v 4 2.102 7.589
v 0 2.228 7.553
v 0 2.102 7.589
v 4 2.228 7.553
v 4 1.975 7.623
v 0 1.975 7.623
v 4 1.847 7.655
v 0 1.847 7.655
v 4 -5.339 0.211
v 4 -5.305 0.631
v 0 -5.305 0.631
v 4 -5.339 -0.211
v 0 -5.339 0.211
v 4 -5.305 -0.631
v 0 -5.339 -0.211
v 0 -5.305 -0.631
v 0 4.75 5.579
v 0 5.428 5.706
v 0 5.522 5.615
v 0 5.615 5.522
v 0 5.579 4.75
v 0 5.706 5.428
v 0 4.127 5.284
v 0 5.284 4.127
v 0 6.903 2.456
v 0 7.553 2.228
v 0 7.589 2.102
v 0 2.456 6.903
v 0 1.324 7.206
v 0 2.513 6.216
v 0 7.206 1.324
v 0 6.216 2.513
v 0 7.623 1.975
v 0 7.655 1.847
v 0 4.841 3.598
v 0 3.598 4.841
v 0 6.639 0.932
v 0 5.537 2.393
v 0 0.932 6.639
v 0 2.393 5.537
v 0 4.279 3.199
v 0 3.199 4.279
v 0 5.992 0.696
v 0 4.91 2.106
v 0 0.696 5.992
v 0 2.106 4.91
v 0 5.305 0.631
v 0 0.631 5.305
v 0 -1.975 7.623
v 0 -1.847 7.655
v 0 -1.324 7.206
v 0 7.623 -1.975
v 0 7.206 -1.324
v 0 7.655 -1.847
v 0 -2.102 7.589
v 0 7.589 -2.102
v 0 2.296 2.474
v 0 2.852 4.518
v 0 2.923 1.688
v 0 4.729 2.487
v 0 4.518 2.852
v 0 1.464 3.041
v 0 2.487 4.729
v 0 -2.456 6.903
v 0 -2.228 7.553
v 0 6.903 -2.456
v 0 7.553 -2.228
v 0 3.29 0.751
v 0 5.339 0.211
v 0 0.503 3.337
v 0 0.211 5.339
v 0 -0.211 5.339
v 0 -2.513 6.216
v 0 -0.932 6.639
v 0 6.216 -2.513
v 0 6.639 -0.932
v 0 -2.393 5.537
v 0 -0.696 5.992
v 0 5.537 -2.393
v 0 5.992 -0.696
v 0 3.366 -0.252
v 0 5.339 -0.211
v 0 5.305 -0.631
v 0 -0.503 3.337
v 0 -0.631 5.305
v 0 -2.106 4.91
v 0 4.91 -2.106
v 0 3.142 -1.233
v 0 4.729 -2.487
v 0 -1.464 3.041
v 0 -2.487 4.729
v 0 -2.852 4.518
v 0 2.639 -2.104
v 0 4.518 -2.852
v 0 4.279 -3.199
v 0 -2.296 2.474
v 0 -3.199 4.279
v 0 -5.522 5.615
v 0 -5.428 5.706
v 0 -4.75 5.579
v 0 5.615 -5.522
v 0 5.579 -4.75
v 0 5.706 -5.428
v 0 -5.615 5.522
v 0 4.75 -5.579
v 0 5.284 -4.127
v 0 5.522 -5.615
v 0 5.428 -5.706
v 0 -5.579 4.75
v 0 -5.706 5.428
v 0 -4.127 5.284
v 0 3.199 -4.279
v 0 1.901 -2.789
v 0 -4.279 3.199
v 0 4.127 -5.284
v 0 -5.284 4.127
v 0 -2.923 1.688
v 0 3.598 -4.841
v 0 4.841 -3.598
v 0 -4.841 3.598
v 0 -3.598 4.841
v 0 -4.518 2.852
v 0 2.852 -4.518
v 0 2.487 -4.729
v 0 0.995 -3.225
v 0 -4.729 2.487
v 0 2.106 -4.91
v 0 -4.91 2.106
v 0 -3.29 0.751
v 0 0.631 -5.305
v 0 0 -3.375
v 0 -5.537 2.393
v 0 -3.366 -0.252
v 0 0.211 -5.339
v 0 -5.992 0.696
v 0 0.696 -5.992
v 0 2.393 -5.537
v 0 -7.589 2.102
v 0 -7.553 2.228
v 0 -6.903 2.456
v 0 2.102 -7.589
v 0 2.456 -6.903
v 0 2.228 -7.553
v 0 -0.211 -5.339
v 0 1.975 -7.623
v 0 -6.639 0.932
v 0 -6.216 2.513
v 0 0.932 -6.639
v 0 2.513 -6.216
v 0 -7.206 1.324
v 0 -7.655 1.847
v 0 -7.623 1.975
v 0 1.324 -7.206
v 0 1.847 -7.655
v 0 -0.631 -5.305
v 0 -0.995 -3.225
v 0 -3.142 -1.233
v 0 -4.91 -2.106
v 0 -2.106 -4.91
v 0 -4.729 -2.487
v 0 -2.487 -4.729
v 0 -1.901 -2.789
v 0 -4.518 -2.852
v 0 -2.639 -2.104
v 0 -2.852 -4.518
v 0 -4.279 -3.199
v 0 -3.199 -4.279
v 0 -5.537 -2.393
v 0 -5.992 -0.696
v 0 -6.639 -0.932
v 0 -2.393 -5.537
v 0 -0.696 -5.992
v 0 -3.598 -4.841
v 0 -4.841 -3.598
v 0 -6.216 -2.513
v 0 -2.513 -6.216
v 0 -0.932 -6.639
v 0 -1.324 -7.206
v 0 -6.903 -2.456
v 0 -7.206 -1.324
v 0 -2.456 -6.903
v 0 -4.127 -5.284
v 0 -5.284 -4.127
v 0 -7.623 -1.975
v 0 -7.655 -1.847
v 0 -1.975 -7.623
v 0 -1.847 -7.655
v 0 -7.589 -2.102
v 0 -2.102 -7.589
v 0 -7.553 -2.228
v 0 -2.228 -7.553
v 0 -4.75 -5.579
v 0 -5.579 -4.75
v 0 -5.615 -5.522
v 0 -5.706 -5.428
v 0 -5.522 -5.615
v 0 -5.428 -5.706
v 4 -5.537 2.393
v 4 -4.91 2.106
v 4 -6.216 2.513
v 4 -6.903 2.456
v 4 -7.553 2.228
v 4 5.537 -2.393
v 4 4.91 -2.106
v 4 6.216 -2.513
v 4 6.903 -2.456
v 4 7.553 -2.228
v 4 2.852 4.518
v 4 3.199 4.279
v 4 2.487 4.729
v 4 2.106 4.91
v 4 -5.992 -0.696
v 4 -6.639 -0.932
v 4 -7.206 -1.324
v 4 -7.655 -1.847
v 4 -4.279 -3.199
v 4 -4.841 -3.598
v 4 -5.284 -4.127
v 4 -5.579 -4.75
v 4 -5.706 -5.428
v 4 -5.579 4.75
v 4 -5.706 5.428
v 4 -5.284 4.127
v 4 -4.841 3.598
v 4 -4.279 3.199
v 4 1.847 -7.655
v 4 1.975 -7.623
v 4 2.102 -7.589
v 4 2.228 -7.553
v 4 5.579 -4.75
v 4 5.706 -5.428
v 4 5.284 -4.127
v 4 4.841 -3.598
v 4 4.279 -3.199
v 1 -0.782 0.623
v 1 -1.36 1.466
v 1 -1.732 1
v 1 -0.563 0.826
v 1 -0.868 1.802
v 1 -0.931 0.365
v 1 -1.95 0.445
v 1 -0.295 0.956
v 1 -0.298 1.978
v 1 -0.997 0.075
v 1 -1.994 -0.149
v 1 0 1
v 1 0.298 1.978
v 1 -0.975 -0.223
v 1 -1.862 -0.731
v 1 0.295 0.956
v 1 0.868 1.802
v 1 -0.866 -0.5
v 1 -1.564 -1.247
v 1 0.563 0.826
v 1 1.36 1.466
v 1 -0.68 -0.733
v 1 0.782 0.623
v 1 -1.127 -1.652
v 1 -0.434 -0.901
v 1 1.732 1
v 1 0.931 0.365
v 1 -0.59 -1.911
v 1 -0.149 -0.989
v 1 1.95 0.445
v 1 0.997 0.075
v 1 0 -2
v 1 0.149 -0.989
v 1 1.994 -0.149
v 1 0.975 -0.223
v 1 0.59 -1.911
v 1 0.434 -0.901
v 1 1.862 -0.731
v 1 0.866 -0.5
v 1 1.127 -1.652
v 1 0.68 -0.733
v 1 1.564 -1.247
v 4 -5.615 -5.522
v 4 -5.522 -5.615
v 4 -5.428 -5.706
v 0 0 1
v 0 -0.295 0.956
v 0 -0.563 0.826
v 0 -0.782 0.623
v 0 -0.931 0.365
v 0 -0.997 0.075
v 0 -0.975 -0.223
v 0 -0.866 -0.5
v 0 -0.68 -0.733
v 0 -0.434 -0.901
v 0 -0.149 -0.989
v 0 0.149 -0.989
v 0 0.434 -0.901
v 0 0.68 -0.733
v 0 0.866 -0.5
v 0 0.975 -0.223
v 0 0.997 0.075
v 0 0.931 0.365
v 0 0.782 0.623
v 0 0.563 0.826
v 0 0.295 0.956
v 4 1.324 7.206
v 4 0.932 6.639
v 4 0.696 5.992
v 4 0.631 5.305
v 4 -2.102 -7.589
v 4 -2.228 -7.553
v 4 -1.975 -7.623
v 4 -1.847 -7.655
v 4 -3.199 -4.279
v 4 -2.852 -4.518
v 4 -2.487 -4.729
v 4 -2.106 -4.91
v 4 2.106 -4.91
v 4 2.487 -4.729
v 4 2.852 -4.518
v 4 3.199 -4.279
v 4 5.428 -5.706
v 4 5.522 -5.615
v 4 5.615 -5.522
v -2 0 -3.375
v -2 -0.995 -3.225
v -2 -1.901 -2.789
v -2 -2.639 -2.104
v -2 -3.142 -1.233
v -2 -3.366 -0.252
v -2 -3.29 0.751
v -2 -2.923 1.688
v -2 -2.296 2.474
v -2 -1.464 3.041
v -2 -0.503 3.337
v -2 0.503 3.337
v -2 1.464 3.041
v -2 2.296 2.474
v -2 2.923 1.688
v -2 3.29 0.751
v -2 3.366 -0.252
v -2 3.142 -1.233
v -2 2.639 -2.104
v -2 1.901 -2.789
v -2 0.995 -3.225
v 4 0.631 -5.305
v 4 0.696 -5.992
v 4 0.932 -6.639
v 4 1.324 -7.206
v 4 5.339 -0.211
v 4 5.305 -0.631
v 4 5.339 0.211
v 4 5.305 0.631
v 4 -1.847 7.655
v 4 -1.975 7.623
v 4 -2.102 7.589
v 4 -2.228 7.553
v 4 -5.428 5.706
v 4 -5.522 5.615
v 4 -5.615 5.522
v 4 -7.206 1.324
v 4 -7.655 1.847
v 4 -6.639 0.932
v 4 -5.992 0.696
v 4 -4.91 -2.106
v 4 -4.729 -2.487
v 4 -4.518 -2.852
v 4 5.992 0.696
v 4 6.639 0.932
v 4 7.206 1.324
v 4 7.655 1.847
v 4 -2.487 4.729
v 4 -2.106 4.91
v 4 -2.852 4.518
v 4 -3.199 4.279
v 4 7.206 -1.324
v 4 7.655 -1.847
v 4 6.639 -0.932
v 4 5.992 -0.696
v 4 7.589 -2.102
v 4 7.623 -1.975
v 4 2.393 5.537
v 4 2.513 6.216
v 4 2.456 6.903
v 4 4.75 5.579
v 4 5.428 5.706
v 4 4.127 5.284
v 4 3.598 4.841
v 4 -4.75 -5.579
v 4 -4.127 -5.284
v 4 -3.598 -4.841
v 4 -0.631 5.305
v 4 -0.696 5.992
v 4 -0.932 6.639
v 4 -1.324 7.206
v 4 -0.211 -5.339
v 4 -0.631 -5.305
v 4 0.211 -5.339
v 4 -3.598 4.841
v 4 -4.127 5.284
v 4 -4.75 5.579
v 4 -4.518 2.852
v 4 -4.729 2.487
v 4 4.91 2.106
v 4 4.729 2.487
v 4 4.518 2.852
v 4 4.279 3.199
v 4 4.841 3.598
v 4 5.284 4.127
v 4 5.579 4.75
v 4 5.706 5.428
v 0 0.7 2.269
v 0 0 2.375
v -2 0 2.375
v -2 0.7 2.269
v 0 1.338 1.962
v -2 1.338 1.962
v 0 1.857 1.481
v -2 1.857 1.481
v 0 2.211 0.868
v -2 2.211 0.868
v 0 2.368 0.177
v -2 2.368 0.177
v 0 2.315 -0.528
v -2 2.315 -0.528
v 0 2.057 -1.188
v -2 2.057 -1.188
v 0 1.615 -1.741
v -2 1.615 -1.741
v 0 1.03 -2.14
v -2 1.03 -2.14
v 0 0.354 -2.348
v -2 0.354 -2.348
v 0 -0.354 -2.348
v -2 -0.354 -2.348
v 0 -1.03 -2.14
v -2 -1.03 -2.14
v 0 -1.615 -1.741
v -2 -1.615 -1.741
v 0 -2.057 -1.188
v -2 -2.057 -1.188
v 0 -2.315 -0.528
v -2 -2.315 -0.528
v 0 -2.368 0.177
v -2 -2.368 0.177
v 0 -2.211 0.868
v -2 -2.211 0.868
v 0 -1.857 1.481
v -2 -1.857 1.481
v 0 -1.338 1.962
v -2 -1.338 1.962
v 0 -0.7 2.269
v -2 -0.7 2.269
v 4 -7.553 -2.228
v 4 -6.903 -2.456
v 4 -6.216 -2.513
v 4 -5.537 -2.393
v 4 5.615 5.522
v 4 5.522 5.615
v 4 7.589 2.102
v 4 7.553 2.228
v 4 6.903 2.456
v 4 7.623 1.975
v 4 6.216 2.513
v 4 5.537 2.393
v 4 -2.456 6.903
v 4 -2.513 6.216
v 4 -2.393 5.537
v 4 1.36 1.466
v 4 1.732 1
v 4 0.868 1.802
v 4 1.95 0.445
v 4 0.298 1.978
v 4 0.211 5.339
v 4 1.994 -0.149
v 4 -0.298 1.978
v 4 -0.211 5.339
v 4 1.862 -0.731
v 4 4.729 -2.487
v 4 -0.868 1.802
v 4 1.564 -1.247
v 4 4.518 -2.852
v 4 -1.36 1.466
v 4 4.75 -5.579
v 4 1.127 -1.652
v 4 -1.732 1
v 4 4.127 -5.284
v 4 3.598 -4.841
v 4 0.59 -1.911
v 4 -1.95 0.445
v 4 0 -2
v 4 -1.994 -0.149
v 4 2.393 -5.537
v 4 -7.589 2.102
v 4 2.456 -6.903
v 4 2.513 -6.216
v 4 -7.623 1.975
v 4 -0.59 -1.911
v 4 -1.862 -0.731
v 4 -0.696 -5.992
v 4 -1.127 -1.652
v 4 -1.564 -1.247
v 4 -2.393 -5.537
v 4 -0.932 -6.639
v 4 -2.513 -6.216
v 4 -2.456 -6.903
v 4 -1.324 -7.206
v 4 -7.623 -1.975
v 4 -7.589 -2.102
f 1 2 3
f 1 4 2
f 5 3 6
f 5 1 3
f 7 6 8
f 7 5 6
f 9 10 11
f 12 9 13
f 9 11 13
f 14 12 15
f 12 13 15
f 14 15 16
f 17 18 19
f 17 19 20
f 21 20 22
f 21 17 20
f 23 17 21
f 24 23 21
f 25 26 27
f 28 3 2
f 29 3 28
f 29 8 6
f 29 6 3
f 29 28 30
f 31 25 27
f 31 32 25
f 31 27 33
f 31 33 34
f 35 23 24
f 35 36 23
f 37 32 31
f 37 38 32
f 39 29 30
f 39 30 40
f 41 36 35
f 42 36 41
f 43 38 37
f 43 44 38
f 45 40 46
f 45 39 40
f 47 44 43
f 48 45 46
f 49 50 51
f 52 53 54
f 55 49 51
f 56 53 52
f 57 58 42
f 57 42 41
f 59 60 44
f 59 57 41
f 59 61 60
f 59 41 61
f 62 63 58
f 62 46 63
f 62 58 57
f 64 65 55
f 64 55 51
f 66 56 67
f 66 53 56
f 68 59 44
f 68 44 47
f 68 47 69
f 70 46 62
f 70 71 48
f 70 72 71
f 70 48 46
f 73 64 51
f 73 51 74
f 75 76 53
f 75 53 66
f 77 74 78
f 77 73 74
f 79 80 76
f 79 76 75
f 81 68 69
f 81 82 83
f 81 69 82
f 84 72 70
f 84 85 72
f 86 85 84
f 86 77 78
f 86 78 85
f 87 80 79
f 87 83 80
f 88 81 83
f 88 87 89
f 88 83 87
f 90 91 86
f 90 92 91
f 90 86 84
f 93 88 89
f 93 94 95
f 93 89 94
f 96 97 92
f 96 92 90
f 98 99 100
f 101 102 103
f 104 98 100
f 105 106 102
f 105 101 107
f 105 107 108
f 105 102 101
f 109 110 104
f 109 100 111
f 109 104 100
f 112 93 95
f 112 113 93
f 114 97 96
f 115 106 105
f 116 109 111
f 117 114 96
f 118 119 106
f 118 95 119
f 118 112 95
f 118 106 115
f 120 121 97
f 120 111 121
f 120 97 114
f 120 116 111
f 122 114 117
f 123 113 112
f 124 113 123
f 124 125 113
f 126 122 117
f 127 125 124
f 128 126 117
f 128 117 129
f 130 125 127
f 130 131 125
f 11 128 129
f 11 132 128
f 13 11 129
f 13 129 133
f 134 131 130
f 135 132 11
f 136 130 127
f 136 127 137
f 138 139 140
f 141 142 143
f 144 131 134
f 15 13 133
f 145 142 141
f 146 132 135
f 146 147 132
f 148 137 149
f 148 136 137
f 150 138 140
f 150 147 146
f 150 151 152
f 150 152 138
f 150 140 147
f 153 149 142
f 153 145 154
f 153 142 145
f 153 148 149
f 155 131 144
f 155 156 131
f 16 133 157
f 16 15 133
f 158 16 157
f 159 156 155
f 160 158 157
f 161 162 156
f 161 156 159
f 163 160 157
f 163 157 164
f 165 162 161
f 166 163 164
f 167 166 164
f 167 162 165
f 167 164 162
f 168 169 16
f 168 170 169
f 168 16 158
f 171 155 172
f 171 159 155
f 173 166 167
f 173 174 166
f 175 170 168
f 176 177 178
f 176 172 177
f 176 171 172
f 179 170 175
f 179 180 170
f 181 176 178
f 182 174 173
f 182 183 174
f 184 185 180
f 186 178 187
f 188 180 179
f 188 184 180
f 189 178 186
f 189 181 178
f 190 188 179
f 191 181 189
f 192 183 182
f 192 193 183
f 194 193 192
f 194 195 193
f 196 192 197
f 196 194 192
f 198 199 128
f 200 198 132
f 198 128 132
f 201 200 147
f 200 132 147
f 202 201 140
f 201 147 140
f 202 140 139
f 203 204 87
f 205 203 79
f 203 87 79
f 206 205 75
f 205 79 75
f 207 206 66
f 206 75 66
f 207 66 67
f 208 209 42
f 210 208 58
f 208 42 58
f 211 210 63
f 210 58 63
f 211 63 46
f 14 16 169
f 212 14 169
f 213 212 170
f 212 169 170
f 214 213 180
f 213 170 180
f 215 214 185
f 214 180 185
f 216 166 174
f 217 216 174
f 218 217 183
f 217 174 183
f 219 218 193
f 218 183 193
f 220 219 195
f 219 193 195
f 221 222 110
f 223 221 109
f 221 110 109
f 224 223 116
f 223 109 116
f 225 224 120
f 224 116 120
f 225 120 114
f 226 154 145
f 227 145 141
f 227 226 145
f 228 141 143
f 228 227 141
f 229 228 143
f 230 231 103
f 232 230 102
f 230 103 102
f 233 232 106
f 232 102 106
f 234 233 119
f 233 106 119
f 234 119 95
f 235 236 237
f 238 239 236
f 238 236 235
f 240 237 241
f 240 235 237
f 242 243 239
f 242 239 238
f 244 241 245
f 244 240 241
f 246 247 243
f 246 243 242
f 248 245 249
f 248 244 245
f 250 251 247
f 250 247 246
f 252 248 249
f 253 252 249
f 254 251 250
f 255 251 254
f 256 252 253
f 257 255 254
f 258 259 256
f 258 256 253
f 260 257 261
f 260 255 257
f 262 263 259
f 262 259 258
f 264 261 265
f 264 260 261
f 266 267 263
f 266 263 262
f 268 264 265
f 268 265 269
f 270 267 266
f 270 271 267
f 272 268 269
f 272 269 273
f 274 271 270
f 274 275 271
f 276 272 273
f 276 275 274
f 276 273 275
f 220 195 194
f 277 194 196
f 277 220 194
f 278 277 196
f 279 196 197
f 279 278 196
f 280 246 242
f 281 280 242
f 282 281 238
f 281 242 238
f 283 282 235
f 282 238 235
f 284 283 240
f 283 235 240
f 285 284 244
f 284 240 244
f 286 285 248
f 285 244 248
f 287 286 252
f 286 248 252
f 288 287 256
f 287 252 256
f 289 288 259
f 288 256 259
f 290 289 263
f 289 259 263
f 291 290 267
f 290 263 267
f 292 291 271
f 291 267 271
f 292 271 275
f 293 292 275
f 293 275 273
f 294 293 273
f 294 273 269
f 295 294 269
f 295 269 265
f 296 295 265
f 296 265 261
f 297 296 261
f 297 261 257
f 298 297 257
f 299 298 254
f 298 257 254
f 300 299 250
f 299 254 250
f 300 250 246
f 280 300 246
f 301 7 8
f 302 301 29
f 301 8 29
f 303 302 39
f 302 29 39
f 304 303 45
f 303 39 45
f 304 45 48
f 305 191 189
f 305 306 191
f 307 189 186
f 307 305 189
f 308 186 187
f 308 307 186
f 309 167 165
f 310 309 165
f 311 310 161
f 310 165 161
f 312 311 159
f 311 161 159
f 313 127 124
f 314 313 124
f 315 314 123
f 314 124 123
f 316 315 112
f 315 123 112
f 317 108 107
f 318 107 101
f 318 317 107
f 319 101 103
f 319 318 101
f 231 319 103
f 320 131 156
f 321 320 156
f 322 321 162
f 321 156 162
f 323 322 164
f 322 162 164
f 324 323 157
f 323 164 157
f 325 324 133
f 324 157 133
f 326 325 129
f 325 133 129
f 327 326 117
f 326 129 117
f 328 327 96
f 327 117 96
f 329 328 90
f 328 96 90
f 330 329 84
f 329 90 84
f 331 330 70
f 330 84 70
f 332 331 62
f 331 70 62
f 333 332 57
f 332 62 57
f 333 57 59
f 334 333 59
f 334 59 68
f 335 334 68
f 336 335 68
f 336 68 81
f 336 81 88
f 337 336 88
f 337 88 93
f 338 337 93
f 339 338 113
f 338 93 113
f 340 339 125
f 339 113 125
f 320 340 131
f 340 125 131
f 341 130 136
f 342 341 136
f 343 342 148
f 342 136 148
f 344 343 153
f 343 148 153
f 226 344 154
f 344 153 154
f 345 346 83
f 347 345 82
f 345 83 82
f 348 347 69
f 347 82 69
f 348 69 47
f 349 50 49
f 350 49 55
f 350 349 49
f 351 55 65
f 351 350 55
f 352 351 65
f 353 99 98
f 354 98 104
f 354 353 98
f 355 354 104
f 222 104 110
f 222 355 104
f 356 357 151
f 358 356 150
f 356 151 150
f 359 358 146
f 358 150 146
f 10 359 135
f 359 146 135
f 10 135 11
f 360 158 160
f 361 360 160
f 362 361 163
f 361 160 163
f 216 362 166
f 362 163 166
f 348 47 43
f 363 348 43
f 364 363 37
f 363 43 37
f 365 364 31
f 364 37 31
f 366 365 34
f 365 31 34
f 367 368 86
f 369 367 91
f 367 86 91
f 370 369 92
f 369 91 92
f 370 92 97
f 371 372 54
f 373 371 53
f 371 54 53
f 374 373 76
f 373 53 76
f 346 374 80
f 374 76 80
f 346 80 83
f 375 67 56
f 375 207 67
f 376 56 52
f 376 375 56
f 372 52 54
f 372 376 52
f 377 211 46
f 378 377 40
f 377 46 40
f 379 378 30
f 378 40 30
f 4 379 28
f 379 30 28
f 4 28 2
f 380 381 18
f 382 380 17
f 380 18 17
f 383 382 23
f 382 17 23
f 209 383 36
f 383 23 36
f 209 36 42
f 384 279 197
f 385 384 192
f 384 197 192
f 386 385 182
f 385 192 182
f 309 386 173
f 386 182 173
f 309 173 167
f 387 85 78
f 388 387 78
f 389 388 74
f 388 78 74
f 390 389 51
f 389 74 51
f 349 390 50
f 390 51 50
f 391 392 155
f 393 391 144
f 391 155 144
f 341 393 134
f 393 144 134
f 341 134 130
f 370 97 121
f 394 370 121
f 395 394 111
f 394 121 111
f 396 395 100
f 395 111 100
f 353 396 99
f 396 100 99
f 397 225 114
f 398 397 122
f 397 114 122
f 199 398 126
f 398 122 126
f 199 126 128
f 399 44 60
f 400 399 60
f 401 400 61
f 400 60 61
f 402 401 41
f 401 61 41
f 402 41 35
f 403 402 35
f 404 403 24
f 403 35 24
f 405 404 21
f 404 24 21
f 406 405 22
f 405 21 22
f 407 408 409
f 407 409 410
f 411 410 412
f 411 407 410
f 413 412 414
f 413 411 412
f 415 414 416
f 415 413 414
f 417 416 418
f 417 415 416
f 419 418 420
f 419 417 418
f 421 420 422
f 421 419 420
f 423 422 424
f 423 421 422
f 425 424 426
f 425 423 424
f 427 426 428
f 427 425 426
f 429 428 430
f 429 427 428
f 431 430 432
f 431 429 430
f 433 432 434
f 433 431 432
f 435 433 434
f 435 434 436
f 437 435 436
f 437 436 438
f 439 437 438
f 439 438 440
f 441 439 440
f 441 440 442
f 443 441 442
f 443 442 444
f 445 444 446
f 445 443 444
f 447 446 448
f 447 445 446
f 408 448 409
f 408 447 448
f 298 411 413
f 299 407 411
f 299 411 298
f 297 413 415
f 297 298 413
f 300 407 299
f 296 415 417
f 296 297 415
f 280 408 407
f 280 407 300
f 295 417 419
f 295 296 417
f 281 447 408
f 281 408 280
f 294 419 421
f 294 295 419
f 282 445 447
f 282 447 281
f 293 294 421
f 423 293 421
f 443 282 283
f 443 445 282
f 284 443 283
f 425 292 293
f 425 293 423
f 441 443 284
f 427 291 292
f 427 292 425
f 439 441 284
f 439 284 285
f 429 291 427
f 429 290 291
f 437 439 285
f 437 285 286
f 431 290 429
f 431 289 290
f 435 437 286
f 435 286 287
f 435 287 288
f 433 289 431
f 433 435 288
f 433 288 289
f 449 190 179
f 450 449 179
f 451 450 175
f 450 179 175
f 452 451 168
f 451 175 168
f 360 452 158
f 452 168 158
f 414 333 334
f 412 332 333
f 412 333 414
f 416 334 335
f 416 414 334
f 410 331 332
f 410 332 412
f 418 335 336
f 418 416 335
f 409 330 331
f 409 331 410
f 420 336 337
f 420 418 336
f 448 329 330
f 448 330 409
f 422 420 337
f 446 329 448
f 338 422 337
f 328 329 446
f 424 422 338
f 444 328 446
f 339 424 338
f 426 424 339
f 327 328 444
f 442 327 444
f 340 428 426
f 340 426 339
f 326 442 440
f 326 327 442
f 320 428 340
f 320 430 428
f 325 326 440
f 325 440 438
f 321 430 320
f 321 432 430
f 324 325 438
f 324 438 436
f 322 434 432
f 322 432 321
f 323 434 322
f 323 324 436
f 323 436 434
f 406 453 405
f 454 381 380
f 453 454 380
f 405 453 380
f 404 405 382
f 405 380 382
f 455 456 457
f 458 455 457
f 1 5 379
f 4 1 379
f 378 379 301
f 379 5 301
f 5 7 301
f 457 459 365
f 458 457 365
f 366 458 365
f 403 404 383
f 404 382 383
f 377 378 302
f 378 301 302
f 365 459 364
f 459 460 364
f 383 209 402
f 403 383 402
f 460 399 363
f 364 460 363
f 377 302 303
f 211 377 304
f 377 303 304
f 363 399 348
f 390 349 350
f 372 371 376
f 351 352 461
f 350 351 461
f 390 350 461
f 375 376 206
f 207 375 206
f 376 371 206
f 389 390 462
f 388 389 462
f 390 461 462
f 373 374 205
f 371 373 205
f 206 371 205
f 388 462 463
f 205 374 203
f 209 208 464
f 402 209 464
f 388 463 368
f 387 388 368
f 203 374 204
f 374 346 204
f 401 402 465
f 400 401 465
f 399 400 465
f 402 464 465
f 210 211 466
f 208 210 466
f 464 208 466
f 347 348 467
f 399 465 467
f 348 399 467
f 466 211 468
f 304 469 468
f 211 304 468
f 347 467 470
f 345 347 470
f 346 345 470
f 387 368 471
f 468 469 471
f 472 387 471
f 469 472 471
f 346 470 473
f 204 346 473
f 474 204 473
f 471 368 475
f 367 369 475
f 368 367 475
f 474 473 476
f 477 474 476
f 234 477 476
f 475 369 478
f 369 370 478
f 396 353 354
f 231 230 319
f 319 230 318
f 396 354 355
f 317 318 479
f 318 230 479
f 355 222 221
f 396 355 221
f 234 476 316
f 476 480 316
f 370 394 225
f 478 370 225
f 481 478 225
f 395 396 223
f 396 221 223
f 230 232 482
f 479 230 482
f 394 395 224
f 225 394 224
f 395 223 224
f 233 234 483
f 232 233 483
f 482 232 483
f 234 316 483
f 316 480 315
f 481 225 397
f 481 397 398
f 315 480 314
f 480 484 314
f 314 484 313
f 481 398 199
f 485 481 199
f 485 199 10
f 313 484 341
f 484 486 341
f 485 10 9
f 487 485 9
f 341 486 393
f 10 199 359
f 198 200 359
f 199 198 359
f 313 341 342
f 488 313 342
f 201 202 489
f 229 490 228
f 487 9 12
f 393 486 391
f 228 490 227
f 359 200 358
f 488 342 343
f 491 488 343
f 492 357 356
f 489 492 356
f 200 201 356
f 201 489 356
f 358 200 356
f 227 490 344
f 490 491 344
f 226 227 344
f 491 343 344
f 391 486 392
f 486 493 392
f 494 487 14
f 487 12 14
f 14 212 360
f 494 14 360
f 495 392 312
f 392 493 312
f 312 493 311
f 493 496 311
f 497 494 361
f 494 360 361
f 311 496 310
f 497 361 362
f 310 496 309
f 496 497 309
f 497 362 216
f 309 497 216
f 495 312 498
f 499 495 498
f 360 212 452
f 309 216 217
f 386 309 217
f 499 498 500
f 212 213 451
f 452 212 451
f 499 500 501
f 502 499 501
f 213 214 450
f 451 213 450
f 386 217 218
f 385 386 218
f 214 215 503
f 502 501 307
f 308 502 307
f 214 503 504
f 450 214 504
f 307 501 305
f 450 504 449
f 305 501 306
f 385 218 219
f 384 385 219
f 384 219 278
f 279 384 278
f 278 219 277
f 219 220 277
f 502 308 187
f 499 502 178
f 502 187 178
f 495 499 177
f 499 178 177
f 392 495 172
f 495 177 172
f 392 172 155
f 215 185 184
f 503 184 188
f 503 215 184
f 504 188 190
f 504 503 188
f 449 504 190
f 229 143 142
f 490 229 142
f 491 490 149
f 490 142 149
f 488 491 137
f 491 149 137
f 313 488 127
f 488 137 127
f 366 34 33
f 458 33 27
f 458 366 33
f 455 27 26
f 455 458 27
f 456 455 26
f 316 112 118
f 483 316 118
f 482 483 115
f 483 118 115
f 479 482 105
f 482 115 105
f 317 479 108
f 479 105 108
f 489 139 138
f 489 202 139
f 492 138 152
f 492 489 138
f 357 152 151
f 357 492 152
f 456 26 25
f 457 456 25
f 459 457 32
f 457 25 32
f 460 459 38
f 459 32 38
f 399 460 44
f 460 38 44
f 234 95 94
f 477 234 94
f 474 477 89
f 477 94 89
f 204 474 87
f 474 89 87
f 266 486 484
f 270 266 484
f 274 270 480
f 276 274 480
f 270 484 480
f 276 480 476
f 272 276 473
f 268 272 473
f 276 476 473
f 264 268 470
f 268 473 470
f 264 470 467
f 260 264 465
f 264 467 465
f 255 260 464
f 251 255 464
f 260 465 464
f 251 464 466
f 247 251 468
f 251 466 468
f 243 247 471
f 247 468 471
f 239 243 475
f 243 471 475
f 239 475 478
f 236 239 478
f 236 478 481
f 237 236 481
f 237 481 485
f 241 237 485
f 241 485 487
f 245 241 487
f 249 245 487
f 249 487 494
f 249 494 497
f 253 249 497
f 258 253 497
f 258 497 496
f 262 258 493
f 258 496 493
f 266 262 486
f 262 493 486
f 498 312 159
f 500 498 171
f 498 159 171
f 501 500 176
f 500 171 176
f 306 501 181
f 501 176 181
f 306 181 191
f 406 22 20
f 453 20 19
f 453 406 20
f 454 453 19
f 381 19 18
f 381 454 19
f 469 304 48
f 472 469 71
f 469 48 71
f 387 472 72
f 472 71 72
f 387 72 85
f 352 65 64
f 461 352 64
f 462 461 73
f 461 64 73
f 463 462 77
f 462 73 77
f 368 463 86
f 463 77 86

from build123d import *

# Parameters (mm, degrees)
BASPROSKE_W         = 4
BASPROSKE_H         = 7.875
TOOTHCUT_DEPTH      = 12.833480046
TEETHCUTS_COUNT     = 12
TEETHCUTS_ANGLE     = 330
BORSKE_R            = 1
BORE_DEPTH          = 50.0000508
SKETCH1_R           = 3.375
SKETCH1_R_2         = 2.375
BOSS_EXTRUDE1_DEPTH = 2
SKETCH2_R           = 2
CUT_EXTRUDE1_DEPTH  = 3


with BuildPart() as part:
    # BasProSke → Base-Revolve (revolve)
    with BuildSketch(Plane(origin=(0, 0, 0), x_dir=(1, 0, 0), z_dir=(0, 1, 0)), mode=Mode.PRIVATE) as base_revolve_sk:
        with Locations((2, 3.9375)):
            Rectangle(BASPROSKE_W, BASPROSKE_H)
    revolve(base_revolve_sk.sketch.rotate(Axis((-10, 0, 0), (1, 0, 0)), 180), axis=Axis((-10, 0, 0), (1, 0, 0)))

    # TooCutSke → ToothCut (cut, through all)
    with BuildSketch(Plane(origin=(0, 0, 0), x_dir=(0, 0, -1), z_dir=(1, 0, 0))):
        with BuildLine():
            ThreePointArc((0.631439839, 5.305305014), (0, 5.34275), (-0.631439839, 5.305305014))
            ThreePointArc((-0.631439839, 5.305305014), (-0.93992237, 6.654932089), (-1.876748184, 7.674251521))
            ThreePointArc((-1.876748184, 7.674251521), (0, 7.9004), (1.876748184, 7.674251521))
            ThreePointArc((1.876748184, 7.674251521), (0.93992237, 6.654932089), (0.631439839, 5.305305014))
        make_face()
    toothcut = extrude(amount=TOOTHCUT_DEPTH, mode=Mode.SUBTRACT)

    # TeethCuts: ToothCut ×12 about axis
    teethcuts_axis = Axis((-10, 0, 0), (1, 0, 0))
    for i in range(1, TEETHCUTS_COUNT):
        add(toothcut.rotate(teethcuts_axis, i * TEETHCUTS_ANGLE / (TEETHCUTS_COUNT - 1)), mode=Mode.SUBTRACT)

    # BorSke → Bore (cut, symmetric)
    with BuildSketch(Plane(origin=(0, 0, 0), x_dir=(0, 0, -1), z_dir=(1, 0, 0))):
        with Locations(Location((0, 0, 0), (0, 0, 180))):
            Circle(BORSKE_R)
    extrude(amount=BORE_DEPTH, both=True, mode=Mode.SUBTRACT)

    # Sketch1 → Boss-Extrude1 (add)
    with BuildSketch(Plane.ZY):
        with Locations(Location((0, 0, 0), (0, 0, 180))):
            Circle(SKETCH1_R)
        Circle(SKETCH1_R_2, mode=Mode.SUBTRACT)
    extrude(amount=BOSS_EXTRUDE1_DEPTH)

    # Sketch2 → Cut-Extrude1 (cut)
    with BuildSketch(Plane(origin=(4, 0, 0), x_dir=(0, 0, -1), z_dir=(1, 0, 0))):
        Circle(SKETCH2_R)
    extrude(amount=-CUT_EXTRUDE1_DEPTH, mode=Mode.SUBTRACT)


solid = part.part
